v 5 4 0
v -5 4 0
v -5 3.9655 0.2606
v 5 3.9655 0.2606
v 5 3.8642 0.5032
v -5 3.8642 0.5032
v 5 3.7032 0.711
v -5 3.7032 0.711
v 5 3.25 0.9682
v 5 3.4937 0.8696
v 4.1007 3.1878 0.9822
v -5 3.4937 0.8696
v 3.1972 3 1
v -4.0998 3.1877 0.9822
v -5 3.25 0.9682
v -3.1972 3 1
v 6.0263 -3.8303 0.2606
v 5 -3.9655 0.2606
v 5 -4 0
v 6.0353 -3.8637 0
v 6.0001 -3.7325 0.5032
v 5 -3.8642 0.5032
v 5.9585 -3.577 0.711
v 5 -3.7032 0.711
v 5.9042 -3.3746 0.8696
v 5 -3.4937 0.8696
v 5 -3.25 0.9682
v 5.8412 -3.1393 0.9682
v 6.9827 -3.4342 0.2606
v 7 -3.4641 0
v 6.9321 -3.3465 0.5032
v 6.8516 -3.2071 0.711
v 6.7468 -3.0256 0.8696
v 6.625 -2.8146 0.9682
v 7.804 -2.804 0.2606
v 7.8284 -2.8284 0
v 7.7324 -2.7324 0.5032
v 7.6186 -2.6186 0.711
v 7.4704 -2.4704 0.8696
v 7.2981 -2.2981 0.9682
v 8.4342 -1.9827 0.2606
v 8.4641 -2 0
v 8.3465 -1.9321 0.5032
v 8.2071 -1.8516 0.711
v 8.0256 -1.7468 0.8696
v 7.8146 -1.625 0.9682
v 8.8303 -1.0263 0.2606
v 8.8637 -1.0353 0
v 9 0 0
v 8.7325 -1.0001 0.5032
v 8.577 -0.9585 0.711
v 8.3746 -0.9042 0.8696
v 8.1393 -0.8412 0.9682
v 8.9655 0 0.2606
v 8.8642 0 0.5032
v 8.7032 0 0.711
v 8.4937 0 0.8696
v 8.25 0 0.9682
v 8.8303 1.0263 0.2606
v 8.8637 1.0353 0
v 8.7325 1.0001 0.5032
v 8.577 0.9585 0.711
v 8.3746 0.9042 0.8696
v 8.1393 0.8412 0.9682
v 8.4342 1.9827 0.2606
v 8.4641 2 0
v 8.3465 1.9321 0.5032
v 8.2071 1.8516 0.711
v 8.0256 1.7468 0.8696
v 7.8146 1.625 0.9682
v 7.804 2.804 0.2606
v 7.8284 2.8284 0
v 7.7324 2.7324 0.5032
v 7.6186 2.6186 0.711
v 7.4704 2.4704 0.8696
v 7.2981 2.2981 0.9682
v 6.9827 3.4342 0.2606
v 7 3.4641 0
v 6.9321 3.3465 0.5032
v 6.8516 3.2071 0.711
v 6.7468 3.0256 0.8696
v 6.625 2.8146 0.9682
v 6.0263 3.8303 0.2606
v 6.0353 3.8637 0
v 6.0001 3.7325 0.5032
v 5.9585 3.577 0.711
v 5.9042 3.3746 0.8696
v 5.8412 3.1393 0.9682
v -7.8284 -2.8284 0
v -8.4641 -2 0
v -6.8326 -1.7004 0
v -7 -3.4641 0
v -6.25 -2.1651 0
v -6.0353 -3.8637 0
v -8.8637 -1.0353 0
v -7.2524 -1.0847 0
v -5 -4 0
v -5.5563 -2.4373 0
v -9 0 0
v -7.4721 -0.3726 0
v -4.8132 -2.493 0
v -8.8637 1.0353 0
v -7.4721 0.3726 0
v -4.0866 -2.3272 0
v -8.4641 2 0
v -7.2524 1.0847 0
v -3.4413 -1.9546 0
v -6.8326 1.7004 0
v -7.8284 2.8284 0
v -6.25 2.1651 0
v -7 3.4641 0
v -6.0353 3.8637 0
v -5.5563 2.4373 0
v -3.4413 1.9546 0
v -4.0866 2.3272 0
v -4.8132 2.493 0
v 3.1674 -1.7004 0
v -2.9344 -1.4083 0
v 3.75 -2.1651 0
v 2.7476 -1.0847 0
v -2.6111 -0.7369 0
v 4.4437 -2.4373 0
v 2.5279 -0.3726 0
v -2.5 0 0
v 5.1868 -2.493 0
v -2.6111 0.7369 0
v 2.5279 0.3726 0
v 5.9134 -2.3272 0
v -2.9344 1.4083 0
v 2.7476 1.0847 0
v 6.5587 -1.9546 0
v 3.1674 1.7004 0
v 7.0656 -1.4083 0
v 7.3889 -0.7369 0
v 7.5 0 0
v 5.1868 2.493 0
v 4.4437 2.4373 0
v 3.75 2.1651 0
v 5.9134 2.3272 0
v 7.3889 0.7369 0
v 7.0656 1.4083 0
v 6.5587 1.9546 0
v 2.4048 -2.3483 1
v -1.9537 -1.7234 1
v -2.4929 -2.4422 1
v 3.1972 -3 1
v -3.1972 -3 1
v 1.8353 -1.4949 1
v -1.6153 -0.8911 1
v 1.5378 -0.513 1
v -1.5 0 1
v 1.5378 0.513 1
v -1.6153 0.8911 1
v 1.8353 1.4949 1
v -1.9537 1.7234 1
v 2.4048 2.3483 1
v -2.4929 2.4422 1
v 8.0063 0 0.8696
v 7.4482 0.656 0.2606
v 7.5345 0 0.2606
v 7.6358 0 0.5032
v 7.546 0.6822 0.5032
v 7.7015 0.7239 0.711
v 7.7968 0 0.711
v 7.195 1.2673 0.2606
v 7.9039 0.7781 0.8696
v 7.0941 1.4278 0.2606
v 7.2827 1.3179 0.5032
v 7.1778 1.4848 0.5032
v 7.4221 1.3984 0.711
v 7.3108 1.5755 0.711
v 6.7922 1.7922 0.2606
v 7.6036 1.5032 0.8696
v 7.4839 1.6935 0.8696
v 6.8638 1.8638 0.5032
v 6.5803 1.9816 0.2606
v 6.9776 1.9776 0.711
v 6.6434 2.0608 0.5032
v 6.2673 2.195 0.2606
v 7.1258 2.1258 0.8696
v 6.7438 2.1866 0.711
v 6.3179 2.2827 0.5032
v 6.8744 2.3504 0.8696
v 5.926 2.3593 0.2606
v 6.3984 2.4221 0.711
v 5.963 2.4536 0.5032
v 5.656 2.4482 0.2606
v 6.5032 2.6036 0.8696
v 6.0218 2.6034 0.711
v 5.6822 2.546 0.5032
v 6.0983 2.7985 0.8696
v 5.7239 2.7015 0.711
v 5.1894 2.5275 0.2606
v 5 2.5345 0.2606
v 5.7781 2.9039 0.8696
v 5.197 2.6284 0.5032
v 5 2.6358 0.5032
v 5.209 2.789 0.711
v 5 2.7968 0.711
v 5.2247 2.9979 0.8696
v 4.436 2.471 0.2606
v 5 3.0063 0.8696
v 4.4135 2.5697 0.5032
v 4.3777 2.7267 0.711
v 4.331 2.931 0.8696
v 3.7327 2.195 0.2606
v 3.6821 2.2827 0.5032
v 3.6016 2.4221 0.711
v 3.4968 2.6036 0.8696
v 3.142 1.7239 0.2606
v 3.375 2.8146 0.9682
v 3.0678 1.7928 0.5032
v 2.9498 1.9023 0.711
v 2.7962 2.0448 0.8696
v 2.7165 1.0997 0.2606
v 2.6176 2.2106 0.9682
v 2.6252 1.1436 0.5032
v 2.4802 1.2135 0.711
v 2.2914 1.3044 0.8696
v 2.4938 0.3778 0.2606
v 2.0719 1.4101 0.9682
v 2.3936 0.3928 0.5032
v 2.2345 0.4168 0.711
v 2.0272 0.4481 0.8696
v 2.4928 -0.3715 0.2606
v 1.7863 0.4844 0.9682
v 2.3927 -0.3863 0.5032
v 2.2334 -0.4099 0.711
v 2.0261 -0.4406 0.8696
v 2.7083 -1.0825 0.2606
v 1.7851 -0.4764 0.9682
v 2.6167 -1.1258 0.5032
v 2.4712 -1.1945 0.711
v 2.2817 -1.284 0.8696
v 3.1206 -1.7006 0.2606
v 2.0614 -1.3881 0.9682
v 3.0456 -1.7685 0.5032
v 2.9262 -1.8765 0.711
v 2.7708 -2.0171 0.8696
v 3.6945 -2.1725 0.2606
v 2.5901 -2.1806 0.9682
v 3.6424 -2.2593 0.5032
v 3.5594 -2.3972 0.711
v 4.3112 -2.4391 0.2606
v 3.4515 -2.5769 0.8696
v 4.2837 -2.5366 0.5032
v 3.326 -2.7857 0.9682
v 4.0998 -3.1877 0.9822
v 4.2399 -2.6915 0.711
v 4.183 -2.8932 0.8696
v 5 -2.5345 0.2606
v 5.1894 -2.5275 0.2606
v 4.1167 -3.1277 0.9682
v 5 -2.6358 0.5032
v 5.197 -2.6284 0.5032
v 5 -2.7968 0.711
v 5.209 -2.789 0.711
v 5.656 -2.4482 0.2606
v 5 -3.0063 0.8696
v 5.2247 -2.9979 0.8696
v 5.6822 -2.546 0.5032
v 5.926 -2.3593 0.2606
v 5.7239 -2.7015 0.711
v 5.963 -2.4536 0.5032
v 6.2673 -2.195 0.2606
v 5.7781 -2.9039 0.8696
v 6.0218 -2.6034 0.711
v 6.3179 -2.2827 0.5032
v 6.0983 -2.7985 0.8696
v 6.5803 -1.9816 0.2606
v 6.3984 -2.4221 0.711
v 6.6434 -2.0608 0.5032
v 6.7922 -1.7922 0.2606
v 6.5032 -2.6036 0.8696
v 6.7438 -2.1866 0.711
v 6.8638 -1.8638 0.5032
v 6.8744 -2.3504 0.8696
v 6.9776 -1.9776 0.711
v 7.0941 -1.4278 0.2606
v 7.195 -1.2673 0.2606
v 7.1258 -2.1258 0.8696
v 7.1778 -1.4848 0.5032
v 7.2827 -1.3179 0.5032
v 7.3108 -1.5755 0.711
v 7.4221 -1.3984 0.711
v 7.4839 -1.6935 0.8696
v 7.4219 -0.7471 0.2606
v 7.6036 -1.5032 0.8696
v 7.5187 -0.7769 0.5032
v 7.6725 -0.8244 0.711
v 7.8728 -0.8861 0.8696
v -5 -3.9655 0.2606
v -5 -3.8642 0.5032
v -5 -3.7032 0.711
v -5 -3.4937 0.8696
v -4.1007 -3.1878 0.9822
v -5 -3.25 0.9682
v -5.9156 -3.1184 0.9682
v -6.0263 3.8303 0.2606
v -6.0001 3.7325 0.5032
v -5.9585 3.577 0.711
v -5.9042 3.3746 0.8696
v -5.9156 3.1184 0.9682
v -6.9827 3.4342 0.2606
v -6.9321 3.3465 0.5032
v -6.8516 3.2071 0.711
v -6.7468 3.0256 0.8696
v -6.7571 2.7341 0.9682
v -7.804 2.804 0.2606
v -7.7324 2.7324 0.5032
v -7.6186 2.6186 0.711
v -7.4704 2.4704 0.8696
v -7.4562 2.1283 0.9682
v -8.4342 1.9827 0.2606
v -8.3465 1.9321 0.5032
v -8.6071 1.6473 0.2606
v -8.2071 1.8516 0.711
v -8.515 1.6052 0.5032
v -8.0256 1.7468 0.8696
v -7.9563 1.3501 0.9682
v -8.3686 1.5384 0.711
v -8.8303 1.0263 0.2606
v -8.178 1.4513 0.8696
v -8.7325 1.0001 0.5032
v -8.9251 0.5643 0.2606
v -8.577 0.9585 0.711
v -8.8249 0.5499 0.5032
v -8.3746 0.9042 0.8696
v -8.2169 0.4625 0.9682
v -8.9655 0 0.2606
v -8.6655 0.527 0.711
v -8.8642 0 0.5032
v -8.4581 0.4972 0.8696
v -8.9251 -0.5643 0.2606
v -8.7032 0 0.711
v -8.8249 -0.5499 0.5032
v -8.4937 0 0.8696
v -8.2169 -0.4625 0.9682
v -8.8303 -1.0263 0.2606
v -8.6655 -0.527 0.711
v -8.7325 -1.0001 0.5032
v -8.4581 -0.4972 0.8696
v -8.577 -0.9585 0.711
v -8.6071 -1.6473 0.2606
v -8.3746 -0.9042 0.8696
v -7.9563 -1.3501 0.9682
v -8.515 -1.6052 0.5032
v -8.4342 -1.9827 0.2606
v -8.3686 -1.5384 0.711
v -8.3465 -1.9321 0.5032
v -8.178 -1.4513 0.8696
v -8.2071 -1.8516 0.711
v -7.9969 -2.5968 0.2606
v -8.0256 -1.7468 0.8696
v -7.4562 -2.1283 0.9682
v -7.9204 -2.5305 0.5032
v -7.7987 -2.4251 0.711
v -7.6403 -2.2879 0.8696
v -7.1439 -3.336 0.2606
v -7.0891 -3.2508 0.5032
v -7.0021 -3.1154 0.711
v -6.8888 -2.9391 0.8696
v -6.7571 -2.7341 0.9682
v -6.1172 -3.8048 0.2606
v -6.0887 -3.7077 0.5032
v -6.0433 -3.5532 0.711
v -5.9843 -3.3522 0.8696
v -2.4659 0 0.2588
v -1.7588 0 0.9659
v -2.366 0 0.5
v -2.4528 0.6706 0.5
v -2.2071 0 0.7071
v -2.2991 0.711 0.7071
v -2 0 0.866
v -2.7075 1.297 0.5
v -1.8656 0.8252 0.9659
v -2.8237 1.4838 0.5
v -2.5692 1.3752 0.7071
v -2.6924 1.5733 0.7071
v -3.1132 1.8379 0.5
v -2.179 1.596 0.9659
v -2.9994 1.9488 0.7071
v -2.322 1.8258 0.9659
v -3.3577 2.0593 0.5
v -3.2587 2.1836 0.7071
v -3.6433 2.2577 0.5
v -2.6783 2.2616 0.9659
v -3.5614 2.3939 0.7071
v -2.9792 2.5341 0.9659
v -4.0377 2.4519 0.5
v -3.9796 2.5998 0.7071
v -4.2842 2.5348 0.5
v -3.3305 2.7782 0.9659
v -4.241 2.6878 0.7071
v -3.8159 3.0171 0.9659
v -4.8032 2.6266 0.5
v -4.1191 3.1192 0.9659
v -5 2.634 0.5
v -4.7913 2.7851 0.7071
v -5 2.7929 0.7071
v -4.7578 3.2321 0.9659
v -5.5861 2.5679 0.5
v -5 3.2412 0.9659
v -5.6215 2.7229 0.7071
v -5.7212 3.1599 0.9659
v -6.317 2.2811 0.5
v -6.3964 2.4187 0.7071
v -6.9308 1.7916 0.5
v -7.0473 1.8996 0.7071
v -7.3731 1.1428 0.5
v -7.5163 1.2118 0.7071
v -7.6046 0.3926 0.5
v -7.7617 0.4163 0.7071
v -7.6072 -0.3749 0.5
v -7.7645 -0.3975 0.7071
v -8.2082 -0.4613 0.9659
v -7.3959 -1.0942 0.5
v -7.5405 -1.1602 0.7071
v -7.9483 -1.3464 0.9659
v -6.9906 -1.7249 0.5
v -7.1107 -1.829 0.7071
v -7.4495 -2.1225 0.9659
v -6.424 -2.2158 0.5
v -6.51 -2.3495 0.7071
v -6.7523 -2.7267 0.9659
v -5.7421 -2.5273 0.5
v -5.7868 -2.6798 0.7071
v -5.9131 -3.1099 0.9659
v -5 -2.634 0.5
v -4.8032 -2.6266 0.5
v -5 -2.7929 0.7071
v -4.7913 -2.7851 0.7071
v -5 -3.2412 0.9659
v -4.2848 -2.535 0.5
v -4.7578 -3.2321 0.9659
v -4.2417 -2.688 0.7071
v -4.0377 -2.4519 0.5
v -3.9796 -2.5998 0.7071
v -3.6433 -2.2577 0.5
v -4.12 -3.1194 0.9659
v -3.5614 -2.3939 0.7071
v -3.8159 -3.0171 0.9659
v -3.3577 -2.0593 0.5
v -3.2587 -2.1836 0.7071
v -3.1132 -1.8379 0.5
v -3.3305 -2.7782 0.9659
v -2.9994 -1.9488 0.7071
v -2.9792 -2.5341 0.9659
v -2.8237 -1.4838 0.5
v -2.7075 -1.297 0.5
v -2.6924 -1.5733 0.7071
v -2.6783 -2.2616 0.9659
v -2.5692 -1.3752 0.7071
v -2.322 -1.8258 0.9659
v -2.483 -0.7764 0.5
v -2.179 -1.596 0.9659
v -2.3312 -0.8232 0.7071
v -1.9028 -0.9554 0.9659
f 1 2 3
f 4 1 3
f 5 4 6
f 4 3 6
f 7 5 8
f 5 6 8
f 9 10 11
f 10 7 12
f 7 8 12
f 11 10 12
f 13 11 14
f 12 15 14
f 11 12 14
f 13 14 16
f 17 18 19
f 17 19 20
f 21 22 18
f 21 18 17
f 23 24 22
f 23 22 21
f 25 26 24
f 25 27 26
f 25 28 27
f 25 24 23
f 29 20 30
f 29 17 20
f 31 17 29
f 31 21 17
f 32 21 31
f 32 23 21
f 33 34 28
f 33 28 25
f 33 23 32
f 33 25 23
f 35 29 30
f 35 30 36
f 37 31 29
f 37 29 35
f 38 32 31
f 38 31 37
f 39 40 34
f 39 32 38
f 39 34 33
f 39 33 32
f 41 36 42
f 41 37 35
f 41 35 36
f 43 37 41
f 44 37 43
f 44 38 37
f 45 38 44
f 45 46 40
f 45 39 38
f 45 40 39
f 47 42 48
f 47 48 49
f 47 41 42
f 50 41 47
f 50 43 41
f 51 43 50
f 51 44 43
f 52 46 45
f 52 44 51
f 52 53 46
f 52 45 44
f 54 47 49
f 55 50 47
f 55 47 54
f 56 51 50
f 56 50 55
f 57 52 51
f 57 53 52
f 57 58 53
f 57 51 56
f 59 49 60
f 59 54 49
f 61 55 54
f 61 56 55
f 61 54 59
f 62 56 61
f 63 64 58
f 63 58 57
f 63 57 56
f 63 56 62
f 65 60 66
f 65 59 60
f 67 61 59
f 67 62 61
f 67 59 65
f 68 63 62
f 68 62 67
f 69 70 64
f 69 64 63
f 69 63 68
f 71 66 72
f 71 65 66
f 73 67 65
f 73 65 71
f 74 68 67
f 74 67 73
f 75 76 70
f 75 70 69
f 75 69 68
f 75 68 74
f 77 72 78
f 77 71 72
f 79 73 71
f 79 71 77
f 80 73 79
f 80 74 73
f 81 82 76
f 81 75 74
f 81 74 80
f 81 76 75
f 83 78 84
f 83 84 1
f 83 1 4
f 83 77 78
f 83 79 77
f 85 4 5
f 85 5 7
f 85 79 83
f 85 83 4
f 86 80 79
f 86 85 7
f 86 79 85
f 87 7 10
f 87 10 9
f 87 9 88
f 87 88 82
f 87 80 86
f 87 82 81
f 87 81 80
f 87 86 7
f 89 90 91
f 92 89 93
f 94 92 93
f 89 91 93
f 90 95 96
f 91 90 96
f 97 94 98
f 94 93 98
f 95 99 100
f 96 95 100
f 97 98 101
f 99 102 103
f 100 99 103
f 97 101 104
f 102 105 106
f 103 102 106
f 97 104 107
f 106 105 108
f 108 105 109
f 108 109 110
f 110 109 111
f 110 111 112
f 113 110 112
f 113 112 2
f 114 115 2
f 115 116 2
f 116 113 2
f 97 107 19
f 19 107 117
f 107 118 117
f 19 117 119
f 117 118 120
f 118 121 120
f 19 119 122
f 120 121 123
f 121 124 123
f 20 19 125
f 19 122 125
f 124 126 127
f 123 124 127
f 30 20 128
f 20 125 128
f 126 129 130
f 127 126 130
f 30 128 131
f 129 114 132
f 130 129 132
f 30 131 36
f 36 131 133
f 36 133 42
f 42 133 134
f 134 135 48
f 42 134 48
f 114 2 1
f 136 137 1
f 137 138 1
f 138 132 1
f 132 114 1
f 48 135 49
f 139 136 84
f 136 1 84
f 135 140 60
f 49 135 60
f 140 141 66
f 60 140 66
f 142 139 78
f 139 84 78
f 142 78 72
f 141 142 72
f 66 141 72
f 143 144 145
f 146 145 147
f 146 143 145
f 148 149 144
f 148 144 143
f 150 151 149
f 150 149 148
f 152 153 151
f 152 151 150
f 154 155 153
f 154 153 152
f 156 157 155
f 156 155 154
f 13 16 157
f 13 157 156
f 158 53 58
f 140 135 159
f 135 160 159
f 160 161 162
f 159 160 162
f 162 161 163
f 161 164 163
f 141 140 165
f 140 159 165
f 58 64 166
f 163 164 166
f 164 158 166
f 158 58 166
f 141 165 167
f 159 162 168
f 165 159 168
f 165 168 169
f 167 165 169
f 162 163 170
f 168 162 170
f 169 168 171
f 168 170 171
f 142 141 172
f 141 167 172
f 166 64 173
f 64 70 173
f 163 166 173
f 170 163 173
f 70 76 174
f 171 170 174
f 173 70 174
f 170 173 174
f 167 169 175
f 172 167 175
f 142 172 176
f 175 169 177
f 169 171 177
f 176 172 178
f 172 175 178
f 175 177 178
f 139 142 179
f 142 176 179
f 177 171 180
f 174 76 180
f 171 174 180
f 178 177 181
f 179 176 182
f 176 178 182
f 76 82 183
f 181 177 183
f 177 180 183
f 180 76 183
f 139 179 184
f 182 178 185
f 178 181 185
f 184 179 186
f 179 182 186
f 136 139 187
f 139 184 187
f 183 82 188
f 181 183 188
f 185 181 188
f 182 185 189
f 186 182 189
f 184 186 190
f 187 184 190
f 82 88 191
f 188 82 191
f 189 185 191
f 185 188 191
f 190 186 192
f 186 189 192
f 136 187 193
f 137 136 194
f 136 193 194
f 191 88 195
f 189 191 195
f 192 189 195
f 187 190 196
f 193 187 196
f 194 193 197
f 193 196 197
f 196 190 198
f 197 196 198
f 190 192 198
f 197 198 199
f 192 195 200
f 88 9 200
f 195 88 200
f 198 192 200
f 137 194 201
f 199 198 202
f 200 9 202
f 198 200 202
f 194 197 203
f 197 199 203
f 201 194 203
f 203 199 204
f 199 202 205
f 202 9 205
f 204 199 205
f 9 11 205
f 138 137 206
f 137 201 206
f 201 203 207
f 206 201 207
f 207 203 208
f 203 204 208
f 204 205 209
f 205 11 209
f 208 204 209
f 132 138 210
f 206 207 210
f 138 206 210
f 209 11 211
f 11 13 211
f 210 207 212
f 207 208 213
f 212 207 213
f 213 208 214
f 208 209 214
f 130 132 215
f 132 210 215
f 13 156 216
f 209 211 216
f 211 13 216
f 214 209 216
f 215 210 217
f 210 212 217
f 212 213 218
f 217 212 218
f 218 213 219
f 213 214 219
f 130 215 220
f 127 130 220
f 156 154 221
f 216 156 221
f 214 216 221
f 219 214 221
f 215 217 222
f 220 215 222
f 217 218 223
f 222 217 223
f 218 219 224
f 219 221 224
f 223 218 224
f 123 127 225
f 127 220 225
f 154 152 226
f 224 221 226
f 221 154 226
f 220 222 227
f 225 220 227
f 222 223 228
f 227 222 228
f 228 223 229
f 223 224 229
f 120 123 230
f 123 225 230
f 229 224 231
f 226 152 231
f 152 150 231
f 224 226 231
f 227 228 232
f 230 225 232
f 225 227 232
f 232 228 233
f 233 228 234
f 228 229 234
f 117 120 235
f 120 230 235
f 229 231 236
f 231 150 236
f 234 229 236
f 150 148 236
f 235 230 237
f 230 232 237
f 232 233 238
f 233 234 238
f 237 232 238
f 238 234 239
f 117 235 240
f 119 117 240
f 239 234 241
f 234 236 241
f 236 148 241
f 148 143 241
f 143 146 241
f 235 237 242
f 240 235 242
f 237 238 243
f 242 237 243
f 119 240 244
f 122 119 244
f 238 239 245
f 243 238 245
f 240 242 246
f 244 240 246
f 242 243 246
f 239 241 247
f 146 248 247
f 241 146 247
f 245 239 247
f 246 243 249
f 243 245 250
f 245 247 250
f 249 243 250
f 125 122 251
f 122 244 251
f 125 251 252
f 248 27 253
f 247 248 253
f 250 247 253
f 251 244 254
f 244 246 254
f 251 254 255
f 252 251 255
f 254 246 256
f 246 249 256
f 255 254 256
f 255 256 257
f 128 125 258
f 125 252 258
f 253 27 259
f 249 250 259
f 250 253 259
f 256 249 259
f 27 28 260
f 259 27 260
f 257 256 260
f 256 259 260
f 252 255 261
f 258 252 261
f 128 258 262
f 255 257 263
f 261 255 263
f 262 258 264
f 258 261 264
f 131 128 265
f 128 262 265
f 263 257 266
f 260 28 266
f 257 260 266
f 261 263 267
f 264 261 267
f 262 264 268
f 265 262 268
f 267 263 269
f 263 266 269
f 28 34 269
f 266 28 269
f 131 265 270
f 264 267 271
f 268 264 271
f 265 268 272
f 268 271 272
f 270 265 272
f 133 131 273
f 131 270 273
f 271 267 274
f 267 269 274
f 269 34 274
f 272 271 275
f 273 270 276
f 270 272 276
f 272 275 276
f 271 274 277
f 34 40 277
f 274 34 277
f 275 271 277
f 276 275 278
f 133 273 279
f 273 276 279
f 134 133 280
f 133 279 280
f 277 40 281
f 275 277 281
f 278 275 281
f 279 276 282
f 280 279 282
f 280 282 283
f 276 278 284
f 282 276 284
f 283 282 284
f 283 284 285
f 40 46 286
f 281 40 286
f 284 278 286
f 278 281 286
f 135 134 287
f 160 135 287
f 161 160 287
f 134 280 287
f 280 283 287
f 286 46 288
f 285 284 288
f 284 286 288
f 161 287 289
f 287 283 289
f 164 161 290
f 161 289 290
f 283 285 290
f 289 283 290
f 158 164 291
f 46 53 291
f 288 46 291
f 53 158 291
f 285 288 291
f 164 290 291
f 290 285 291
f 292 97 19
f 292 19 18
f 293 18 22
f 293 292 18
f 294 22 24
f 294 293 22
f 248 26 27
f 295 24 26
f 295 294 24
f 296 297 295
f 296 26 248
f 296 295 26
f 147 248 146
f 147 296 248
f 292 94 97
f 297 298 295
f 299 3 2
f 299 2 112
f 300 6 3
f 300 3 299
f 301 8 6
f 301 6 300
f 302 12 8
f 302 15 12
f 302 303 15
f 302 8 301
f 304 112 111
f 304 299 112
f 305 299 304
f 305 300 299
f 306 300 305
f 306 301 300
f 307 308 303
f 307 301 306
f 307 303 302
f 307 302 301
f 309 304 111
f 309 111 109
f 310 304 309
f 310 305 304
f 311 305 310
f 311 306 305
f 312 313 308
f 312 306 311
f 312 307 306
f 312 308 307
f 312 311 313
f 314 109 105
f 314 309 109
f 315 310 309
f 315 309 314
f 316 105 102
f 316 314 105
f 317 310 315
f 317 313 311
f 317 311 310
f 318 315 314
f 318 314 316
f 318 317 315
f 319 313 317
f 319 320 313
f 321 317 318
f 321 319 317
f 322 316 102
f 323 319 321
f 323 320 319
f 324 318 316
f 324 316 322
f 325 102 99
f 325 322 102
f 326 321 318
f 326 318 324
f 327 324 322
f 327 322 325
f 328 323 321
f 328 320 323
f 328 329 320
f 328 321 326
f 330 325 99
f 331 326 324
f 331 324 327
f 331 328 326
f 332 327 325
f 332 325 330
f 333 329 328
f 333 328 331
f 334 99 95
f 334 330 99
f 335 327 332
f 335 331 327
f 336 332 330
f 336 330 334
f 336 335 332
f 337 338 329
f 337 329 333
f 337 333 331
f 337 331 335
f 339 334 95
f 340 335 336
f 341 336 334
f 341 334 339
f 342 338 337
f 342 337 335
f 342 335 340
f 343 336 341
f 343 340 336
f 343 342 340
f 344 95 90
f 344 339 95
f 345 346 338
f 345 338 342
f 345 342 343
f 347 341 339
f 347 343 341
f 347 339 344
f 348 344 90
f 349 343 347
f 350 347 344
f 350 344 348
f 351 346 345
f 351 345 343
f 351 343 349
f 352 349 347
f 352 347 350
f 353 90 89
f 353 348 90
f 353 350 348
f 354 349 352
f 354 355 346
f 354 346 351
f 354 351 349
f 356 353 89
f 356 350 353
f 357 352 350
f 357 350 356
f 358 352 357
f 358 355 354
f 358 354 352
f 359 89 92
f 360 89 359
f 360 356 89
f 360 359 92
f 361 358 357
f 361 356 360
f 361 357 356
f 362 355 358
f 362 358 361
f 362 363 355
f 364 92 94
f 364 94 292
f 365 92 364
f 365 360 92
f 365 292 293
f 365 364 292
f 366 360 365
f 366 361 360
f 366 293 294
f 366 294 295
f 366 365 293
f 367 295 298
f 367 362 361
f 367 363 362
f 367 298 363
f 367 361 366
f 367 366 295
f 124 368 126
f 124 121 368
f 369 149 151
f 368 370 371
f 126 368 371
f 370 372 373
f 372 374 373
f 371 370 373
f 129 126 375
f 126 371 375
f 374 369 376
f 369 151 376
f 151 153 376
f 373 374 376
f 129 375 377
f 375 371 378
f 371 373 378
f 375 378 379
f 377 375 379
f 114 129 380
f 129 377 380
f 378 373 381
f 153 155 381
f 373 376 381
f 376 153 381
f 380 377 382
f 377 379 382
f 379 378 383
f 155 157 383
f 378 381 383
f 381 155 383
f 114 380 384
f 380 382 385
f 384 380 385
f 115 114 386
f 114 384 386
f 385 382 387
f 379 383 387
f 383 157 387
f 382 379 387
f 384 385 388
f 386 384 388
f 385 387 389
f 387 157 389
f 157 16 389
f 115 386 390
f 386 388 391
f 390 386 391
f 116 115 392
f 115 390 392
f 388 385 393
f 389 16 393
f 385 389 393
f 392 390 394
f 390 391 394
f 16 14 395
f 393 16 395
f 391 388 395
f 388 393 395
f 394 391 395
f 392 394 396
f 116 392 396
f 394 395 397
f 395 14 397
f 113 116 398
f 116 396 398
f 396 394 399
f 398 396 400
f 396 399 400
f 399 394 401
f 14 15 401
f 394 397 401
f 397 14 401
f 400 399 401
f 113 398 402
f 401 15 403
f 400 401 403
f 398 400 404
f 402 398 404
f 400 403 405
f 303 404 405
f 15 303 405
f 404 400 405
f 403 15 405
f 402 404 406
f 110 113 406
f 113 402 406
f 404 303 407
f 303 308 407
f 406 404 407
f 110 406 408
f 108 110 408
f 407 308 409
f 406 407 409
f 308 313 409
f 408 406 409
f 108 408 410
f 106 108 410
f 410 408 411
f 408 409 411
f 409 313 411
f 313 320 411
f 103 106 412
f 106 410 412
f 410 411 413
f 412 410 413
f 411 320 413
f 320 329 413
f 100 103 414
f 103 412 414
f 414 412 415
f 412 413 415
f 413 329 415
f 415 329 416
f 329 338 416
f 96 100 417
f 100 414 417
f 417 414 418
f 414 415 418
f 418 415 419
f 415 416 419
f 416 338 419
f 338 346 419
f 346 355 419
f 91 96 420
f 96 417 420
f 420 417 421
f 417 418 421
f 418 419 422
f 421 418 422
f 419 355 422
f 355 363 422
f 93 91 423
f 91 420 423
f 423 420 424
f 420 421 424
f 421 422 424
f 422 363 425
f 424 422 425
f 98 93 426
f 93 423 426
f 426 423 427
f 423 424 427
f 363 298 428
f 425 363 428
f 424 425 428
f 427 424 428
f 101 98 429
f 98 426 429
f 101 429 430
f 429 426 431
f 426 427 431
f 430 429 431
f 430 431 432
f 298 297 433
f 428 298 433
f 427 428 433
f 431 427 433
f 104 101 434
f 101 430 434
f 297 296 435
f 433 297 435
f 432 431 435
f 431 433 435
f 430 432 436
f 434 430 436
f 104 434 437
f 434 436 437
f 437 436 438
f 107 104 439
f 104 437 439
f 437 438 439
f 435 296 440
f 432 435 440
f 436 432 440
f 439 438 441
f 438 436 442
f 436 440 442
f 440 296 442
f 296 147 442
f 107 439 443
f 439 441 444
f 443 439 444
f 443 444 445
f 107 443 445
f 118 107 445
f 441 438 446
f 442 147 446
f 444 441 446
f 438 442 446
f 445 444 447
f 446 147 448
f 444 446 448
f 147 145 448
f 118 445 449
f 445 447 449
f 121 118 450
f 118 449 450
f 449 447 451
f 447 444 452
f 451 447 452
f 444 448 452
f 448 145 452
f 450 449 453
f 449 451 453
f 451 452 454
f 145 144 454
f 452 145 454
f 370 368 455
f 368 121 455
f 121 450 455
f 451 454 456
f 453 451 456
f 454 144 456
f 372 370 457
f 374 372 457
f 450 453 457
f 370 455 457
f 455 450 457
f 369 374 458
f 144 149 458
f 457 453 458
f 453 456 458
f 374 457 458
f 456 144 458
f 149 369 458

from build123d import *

# Parameters (mm, degrees)
F0_R         = 2.5
F1_DEPTH     = 1
F2_T1_DEPTH  = 10
F2_T4_ANGLE  = 180
F2_T10_ANGLE = 180


# Not quite as in the source:
# - a fillet or chamfer that OpenCascade refuses, or shapes differently, is made with other operations: its cross-section is extruded or revolved along the edge and cut away or added


with BuildPart() as f1:
    # F0 (on Top) → F1 (new body)
    with BuildSketch(Plane.XY):
        with BuildLine():
            Line((5, 4), (-5, 4))
            ThreePointArc((-5, 4), (-9, 0), (-5, -4))
            Line((-5, -4), (5, -4))
            ThreePointArc((5, -4), (9, 0), (5, 4))
        make_face()
        with Locations((-5, 0)):
            Circle(F0_R, mode=Mode.SUBTRACT)
        with Locations((5, 0)):
            Circle(F0_R, mode=Mode.SUBTRACT)
    extrude(amount=F1_DEPTH)

    # F2: fillet of radius 1 on 3 edges, made by hand

    # F2_s2 → F2_t1 (cut)
    with BuildSketch(Plane.YZ.offset(-5)):
        with BuildLine():
            ThreePointArc((4, 0), (3.7071067812, 0.7071067812), (3, 1))
            Line((3, 1), (4, 1))
            Line((4, 1), (4, 0))
        make_face()
        with BuildLine():
            ThreePointArc((-4, 0), (-3.7071067812, 0.7071067812), (-3, 1))
            Line((-3, 1), (-4, 1))
            Line((-4, 1), (-4, 0))
        make_face()
    extrude(amount=F2_T1_DEPTH, mode=Mode.SUBTRACT)

    # F2_s3 → F2_t4 (revolve, cut)
    with BuildSketch(Plane.YZ.offset(-5)):
        with BuildLine():
            ThreePointArc((4, 0), (3.7071067812, 0.7071067812), (3, 1))
            Line((3, 1), (4, 1))
            Line((4, 1), (4, 0))
        make_face()
    revolve(axis=Axis((-5, 0, 1), (0, 0, 1)), revolution_arc=F2_T4_ANGLE, mode=Mode.SUBTRACT)

    # F2_s5 → F2_t6 (revolve, cut)
    with BuildSketch(Plane.XZ):
        with BuildLine():
            ThreePointArc((-2.5, 0), (-2.2071067812, 0.7071067812), (-1.5, 1))
            Line((-1.5, 1), (-2.5, 1))
            Line((-2.5, 1), (-2.5, 0))
        make_face()
    revolve(axis=Axis((-5, 0, 1), (0, 0, 1)), mode=Mode.SUBTRACT)

    # F2_s7 → F2_t8 (revolve, cut)
    with BuildSketch(Plane.XZ):
        with BuildLine():
            ThreePointArc((7.5, 0), (7.7928932188, 0.7071067812), (8.5, 1))
            Line((8.5, 1), (7.5, 1))
            Line((7.5, 1), (7.5, 0))
        make_face()
    revolve(axis=Axis((5, 0, 1), (0, 0, 1)), mode=Mode.SUBTRACT)

    # F2_s9 → F2_t10 (revolve, cut)
    with BuildSketch(Plane.YZ.offset(5)):
        with BuildLine():
            ThreePointArc((-4, 0), (-3.7071067812, 0.7071067812), (-3, 1))
            Line((-3, 1), (-4, 1))
            Line((-4, 1), (-4, 0))
        make_face()
    revolve(axis=Axis((5, 0, 1), (0, 0, 1)), revolution_arc=F2_T10_ANGLE, mode=Mode.SUBTRACT)


solid = f1.part
